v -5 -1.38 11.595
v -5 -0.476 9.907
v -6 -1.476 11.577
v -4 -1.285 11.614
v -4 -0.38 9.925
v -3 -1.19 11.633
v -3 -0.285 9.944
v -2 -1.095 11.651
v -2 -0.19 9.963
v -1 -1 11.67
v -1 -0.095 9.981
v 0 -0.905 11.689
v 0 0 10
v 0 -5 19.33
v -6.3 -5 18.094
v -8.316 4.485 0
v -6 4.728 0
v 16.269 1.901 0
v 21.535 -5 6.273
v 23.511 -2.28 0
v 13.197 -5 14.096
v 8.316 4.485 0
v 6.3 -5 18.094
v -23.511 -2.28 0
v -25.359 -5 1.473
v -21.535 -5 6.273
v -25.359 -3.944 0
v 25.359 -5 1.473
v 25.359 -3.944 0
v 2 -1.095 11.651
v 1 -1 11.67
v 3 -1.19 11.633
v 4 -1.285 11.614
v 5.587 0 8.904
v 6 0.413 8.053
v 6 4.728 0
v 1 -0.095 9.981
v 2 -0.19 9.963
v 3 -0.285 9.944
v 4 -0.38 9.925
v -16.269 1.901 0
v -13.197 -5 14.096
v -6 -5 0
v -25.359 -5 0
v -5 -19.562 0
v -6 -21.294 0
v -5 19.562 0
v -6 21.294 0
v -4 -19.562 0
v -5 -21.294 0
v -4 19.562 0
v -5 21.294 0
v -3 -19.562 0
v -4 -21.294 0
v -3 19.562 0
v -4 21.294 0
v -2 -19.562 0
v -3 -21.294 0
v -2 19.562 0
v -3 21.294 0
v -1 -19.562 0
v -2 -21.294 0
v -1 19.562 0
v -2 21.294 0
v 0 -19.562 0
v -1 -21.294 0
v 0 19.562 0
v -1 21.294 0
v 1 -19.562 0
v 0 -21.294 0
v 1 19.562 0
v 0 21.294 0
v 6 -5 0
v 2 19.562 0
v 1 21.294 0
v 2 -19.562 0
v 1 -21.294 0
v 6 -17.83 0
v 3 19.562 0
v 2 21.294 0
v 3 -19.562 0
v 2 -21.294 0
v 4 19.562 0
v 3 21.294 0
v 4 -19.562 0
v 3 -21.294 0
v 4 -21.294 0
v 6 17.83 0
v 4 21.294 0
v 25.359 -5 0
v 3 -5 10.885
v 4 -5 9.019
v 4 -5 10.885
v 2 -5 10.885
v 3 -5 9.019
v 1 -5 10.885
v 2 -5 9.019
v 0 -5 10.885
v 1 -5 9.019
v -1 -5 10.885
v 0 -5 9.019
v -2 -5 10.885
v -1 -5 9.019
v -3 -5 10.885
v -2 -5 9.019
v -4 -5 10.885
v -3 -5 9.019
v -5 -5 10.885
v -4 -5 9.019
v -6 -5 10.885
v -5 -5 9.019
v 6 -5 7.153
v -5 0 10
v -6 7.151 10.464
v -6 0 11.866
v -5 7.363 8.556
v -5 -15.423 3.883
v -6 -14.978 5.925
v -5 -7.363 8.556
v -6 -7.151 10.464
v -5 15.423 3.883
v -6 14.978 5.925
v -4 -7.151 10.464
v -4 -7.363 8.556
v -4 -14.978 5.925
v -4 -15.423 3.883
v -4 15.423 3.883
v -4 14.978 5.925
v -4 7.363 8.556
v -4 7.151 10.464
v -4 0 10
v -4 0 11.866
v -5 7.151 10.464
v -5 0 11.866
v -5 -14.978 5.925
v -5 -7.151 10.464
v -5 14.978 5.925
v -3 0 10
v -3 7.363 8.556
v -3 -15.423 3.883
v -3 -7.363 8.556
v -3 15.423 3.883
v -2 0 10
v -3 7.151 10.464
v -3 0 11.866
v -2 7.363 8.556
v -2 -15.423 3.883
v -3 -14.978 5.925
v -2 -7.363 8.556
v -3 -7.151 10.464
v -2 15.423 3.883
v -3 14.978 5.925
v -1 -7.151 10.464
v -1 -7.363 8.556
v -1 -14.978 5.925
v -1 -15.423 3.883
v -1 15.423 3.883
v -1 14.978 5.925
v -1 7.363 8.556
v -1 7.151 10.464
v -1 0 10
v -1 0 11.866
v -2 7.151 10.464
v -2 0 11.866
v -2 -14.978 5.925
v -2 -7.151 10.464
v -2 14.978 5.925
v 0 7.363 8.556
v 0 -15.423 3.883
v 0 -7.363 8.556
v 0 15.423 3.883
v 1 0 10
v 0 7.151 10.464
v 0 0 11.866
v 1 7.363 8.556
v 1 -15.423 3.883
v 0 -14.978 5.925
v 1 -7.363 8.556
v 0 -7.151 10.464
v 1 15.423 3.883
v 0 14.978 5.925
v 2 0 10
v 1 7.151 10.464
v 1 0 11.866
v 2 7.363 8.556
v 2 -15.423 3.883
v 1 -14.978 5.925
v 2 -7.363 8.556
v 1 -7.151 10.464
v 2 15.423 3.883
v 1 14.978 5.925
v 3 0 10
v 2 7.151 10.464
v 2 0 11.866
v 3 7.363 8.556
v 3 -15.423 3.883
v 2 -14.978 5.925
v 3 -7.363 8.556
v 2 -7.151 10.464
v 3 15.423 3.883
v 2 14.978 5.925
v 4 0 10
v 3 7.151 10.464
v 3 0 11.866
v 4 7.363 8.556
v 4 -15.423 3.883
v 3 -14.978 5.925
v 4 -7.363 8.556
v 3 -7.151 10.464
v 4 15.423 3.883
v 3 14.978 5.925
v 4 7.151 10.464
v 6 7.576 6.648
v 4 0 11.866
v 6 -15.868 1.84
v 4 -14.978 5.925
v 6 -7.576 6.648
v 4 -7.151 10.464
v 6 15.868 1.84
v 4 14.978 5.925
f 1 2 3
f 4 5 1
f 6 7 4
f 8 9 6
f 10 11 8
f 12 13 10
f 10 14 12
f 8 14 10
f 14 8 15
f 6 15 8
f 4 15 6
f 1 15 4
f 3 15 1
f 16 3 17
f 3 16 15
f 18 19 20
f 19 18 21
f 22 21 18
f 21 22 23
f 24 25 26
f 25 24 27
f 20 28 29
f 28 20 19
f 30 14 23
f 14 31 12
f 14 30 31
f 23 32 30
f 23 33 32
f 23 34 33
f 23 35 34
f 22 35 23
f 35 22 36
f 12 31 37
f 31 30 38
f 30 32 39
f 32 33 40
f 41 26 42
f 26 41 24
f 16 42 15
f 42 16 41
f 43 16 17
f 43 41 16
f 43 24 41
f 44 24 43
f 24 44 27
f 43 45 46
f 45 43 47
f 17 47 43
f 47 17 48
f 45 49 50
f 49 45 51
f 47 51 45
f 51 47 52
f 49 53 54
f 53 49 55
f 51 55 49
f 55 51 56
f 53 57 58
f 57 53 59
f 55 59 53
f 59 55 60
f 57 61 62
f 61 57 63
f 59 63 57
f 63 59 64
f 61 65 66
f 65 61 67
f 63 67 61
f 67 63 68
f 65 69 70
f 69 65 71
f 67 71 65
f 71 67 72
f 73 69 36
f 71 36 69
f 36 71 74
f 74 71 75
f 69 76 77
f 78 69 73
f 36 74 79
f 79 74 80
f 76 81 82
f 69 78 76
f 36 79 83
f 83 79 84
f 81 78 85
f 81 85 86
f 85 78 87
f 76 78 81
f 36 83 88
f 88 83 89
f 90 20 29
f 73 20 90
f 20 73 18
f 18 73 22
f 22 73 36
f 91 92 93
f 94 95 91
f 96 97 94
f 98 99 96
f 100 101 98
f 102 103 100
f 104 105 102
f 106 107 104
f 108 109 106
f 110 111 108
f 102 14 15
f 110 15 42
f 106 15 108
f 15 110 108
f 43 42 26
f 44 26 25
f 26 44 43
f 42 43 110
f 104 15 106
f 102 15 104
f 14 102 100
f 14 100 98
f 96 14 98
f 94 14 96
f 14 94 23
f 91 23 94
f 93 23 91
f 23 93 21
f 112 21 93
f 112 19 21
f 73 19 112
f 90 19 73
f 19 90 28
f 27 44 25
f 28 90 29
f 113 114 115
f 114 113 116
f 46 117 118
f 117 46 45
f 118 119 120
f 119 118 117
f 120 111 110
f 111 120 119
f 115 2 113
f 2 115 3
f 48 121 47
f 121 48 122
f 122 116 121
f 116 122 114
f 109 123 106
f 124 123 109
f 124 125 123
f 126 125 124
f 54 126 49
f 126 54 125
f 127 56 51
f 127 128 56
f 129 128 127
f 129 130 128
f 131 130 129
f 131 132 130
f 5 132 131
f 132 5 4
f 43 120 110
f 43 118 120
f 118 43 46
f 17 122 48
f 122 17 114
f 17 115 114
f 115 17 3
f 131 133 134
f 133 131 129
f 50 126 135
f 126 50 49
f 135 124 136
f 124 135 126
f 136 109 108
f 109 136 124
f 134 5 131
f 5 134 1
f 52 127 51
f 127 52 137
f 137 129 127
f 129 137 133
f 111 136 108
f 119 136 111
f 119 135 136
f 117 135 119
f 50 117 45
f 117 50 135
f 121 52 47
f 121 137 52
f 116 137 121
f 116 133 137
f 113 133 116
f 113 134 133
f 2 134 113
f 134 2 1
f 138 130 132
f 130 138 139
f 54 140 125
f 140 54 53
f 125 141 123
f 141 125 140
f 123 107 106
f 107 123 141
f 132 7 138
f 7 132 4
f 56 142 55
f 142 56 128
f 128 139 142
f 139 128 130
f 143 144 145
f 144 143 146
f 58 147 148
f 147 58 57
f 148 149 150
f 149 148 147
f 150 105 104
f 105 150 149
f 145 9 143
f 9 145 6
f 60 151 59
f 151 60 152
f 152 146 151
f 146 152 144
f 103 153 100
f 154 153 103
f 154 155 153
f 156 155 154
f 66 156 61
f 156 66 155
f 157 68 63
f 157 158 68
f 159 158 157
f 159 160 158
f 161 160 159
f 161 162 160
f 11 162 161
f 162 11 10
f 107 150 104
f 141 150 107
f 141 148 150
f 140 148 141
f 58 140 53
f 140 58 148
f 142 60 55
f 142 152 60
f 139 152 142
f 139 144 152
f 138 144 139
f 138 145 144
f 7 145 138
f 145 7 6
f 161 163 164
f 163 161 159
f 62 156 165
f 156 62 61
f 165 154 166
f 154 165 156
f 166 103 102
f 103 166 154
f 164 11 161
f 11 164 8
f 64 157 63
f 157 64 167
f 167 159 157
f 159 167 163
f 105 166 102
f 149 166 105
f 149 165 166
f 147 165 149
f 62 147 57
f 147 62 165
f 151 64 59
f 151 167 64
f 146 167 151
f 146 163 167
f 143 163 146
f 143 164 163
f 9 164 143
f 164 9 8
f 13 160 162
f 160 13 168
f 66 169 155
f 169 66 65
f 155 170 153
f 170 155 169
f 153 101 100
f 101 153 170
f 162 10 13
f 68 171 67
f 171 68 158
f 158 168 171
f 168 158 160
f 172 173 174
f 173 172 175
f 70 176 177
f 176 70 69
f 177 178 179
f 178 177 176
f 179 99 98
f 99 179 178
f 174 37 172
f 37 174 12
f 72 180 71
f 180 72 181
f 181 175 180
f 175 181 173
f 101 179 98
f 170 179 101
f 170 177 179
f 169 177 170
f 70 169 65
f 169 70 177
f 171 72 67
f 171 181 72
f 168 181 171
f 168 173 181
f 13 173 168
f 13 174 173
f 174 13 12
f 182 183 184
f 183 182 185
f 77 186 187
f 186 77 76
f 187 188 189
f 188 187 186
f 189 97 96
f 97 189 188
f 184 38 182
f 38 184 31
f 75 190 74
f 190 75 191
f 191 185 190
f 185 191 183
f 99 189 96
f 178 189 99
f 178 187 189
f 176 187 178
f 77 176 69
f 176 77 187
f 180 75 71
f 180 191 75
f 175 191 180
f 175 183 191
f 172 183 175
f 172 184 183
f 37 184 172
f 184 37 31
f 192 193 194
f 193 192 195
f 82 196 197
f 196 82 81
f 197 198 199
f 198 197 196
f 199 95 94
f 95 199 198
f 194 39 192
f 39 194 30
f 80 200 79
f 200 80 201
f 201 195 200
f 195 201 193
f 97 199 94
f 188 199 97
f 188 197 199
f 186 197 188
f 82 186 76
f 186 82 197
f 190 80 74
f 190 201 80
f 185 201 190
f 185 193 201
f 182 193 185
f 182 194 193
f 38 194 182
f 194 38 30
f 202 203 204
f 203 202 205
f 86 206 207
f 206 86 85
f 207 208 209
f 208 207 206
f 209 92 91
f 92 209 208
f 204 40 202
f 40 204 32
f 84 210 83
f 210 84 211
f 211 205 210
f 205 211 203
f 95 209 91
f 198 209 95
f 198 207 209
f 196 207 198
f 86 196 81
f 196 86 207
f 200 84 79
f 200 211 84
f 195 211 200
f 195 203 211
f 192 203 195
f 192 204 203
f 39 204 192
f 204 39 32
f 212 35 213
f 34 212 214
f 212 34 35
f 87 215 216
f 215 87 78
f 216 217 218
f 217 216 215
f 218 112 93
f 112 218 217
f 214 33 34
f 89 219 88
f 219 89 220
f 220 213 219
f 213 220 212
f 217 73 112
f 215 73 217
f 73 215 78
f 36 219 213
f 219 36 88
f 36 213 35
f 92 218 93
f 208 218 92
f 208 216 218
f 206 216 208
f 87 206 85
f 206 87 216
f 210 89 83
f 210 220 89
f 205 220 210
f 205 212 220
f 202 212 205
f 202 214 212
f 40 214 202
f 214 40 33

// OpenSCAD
rotate([0,0,90])
parabola(40, 10, 1, 10);
multi_parabola (40, 10, 1, 10, 10);
//Creates a filled parabola, using mirrored endpoints.
//d: The distance between the two mirrored endpoints at the base of the parabola.
//roundness: How "rounded" the parabola is.
//h: The height of the parabola's vertex.
//thickness: The thickness of the parabolic section.
module parabola(d, h, roundness, thickness)
{
    r=d*(roundness+1)/2;
    
    distance=sqrt(pow(r,2)-pow((d/2),2));//The distance between the cone's axis and the chord between the two points.
    if(distance!=0)
    {
        run=r-distance; //Assuming a line from the cone's vertex through the parabola's vertex, the horizontal distance underneath the segment between the vertex and the base.
     //The slope of the cone.
        slope=h/run;
        height=r*slope; //The height of the cone.
        section_height=h+thickness*slope+2;
        intersection()
        {
            translate([-distance,0,0])
            cylinder(r1=r, r2=0, h=height);
            
            translate([0,0,section_height/2])
            cube([thickness, d+run*2, section_height], center=true);
        }
    }
    else
    {
        intersection()
        {
            cylinder(r1=d/2, r2=0, h=h);
            
            translate([0,0,h/2+1])
            cube([thickness, d, h+2], center=true);
        }
    }
}

module multi_parabola(d, h, roundness, thickness, resolution)
{
    slice_width=thickness/resolution;
    left_hand=-thickness/2;
    for(i=[0:resolution])
    {
        translate([left_hand+slice_width*i,0,0])
        parabola(d, h, roundness, slice_width+1);
    }
}
